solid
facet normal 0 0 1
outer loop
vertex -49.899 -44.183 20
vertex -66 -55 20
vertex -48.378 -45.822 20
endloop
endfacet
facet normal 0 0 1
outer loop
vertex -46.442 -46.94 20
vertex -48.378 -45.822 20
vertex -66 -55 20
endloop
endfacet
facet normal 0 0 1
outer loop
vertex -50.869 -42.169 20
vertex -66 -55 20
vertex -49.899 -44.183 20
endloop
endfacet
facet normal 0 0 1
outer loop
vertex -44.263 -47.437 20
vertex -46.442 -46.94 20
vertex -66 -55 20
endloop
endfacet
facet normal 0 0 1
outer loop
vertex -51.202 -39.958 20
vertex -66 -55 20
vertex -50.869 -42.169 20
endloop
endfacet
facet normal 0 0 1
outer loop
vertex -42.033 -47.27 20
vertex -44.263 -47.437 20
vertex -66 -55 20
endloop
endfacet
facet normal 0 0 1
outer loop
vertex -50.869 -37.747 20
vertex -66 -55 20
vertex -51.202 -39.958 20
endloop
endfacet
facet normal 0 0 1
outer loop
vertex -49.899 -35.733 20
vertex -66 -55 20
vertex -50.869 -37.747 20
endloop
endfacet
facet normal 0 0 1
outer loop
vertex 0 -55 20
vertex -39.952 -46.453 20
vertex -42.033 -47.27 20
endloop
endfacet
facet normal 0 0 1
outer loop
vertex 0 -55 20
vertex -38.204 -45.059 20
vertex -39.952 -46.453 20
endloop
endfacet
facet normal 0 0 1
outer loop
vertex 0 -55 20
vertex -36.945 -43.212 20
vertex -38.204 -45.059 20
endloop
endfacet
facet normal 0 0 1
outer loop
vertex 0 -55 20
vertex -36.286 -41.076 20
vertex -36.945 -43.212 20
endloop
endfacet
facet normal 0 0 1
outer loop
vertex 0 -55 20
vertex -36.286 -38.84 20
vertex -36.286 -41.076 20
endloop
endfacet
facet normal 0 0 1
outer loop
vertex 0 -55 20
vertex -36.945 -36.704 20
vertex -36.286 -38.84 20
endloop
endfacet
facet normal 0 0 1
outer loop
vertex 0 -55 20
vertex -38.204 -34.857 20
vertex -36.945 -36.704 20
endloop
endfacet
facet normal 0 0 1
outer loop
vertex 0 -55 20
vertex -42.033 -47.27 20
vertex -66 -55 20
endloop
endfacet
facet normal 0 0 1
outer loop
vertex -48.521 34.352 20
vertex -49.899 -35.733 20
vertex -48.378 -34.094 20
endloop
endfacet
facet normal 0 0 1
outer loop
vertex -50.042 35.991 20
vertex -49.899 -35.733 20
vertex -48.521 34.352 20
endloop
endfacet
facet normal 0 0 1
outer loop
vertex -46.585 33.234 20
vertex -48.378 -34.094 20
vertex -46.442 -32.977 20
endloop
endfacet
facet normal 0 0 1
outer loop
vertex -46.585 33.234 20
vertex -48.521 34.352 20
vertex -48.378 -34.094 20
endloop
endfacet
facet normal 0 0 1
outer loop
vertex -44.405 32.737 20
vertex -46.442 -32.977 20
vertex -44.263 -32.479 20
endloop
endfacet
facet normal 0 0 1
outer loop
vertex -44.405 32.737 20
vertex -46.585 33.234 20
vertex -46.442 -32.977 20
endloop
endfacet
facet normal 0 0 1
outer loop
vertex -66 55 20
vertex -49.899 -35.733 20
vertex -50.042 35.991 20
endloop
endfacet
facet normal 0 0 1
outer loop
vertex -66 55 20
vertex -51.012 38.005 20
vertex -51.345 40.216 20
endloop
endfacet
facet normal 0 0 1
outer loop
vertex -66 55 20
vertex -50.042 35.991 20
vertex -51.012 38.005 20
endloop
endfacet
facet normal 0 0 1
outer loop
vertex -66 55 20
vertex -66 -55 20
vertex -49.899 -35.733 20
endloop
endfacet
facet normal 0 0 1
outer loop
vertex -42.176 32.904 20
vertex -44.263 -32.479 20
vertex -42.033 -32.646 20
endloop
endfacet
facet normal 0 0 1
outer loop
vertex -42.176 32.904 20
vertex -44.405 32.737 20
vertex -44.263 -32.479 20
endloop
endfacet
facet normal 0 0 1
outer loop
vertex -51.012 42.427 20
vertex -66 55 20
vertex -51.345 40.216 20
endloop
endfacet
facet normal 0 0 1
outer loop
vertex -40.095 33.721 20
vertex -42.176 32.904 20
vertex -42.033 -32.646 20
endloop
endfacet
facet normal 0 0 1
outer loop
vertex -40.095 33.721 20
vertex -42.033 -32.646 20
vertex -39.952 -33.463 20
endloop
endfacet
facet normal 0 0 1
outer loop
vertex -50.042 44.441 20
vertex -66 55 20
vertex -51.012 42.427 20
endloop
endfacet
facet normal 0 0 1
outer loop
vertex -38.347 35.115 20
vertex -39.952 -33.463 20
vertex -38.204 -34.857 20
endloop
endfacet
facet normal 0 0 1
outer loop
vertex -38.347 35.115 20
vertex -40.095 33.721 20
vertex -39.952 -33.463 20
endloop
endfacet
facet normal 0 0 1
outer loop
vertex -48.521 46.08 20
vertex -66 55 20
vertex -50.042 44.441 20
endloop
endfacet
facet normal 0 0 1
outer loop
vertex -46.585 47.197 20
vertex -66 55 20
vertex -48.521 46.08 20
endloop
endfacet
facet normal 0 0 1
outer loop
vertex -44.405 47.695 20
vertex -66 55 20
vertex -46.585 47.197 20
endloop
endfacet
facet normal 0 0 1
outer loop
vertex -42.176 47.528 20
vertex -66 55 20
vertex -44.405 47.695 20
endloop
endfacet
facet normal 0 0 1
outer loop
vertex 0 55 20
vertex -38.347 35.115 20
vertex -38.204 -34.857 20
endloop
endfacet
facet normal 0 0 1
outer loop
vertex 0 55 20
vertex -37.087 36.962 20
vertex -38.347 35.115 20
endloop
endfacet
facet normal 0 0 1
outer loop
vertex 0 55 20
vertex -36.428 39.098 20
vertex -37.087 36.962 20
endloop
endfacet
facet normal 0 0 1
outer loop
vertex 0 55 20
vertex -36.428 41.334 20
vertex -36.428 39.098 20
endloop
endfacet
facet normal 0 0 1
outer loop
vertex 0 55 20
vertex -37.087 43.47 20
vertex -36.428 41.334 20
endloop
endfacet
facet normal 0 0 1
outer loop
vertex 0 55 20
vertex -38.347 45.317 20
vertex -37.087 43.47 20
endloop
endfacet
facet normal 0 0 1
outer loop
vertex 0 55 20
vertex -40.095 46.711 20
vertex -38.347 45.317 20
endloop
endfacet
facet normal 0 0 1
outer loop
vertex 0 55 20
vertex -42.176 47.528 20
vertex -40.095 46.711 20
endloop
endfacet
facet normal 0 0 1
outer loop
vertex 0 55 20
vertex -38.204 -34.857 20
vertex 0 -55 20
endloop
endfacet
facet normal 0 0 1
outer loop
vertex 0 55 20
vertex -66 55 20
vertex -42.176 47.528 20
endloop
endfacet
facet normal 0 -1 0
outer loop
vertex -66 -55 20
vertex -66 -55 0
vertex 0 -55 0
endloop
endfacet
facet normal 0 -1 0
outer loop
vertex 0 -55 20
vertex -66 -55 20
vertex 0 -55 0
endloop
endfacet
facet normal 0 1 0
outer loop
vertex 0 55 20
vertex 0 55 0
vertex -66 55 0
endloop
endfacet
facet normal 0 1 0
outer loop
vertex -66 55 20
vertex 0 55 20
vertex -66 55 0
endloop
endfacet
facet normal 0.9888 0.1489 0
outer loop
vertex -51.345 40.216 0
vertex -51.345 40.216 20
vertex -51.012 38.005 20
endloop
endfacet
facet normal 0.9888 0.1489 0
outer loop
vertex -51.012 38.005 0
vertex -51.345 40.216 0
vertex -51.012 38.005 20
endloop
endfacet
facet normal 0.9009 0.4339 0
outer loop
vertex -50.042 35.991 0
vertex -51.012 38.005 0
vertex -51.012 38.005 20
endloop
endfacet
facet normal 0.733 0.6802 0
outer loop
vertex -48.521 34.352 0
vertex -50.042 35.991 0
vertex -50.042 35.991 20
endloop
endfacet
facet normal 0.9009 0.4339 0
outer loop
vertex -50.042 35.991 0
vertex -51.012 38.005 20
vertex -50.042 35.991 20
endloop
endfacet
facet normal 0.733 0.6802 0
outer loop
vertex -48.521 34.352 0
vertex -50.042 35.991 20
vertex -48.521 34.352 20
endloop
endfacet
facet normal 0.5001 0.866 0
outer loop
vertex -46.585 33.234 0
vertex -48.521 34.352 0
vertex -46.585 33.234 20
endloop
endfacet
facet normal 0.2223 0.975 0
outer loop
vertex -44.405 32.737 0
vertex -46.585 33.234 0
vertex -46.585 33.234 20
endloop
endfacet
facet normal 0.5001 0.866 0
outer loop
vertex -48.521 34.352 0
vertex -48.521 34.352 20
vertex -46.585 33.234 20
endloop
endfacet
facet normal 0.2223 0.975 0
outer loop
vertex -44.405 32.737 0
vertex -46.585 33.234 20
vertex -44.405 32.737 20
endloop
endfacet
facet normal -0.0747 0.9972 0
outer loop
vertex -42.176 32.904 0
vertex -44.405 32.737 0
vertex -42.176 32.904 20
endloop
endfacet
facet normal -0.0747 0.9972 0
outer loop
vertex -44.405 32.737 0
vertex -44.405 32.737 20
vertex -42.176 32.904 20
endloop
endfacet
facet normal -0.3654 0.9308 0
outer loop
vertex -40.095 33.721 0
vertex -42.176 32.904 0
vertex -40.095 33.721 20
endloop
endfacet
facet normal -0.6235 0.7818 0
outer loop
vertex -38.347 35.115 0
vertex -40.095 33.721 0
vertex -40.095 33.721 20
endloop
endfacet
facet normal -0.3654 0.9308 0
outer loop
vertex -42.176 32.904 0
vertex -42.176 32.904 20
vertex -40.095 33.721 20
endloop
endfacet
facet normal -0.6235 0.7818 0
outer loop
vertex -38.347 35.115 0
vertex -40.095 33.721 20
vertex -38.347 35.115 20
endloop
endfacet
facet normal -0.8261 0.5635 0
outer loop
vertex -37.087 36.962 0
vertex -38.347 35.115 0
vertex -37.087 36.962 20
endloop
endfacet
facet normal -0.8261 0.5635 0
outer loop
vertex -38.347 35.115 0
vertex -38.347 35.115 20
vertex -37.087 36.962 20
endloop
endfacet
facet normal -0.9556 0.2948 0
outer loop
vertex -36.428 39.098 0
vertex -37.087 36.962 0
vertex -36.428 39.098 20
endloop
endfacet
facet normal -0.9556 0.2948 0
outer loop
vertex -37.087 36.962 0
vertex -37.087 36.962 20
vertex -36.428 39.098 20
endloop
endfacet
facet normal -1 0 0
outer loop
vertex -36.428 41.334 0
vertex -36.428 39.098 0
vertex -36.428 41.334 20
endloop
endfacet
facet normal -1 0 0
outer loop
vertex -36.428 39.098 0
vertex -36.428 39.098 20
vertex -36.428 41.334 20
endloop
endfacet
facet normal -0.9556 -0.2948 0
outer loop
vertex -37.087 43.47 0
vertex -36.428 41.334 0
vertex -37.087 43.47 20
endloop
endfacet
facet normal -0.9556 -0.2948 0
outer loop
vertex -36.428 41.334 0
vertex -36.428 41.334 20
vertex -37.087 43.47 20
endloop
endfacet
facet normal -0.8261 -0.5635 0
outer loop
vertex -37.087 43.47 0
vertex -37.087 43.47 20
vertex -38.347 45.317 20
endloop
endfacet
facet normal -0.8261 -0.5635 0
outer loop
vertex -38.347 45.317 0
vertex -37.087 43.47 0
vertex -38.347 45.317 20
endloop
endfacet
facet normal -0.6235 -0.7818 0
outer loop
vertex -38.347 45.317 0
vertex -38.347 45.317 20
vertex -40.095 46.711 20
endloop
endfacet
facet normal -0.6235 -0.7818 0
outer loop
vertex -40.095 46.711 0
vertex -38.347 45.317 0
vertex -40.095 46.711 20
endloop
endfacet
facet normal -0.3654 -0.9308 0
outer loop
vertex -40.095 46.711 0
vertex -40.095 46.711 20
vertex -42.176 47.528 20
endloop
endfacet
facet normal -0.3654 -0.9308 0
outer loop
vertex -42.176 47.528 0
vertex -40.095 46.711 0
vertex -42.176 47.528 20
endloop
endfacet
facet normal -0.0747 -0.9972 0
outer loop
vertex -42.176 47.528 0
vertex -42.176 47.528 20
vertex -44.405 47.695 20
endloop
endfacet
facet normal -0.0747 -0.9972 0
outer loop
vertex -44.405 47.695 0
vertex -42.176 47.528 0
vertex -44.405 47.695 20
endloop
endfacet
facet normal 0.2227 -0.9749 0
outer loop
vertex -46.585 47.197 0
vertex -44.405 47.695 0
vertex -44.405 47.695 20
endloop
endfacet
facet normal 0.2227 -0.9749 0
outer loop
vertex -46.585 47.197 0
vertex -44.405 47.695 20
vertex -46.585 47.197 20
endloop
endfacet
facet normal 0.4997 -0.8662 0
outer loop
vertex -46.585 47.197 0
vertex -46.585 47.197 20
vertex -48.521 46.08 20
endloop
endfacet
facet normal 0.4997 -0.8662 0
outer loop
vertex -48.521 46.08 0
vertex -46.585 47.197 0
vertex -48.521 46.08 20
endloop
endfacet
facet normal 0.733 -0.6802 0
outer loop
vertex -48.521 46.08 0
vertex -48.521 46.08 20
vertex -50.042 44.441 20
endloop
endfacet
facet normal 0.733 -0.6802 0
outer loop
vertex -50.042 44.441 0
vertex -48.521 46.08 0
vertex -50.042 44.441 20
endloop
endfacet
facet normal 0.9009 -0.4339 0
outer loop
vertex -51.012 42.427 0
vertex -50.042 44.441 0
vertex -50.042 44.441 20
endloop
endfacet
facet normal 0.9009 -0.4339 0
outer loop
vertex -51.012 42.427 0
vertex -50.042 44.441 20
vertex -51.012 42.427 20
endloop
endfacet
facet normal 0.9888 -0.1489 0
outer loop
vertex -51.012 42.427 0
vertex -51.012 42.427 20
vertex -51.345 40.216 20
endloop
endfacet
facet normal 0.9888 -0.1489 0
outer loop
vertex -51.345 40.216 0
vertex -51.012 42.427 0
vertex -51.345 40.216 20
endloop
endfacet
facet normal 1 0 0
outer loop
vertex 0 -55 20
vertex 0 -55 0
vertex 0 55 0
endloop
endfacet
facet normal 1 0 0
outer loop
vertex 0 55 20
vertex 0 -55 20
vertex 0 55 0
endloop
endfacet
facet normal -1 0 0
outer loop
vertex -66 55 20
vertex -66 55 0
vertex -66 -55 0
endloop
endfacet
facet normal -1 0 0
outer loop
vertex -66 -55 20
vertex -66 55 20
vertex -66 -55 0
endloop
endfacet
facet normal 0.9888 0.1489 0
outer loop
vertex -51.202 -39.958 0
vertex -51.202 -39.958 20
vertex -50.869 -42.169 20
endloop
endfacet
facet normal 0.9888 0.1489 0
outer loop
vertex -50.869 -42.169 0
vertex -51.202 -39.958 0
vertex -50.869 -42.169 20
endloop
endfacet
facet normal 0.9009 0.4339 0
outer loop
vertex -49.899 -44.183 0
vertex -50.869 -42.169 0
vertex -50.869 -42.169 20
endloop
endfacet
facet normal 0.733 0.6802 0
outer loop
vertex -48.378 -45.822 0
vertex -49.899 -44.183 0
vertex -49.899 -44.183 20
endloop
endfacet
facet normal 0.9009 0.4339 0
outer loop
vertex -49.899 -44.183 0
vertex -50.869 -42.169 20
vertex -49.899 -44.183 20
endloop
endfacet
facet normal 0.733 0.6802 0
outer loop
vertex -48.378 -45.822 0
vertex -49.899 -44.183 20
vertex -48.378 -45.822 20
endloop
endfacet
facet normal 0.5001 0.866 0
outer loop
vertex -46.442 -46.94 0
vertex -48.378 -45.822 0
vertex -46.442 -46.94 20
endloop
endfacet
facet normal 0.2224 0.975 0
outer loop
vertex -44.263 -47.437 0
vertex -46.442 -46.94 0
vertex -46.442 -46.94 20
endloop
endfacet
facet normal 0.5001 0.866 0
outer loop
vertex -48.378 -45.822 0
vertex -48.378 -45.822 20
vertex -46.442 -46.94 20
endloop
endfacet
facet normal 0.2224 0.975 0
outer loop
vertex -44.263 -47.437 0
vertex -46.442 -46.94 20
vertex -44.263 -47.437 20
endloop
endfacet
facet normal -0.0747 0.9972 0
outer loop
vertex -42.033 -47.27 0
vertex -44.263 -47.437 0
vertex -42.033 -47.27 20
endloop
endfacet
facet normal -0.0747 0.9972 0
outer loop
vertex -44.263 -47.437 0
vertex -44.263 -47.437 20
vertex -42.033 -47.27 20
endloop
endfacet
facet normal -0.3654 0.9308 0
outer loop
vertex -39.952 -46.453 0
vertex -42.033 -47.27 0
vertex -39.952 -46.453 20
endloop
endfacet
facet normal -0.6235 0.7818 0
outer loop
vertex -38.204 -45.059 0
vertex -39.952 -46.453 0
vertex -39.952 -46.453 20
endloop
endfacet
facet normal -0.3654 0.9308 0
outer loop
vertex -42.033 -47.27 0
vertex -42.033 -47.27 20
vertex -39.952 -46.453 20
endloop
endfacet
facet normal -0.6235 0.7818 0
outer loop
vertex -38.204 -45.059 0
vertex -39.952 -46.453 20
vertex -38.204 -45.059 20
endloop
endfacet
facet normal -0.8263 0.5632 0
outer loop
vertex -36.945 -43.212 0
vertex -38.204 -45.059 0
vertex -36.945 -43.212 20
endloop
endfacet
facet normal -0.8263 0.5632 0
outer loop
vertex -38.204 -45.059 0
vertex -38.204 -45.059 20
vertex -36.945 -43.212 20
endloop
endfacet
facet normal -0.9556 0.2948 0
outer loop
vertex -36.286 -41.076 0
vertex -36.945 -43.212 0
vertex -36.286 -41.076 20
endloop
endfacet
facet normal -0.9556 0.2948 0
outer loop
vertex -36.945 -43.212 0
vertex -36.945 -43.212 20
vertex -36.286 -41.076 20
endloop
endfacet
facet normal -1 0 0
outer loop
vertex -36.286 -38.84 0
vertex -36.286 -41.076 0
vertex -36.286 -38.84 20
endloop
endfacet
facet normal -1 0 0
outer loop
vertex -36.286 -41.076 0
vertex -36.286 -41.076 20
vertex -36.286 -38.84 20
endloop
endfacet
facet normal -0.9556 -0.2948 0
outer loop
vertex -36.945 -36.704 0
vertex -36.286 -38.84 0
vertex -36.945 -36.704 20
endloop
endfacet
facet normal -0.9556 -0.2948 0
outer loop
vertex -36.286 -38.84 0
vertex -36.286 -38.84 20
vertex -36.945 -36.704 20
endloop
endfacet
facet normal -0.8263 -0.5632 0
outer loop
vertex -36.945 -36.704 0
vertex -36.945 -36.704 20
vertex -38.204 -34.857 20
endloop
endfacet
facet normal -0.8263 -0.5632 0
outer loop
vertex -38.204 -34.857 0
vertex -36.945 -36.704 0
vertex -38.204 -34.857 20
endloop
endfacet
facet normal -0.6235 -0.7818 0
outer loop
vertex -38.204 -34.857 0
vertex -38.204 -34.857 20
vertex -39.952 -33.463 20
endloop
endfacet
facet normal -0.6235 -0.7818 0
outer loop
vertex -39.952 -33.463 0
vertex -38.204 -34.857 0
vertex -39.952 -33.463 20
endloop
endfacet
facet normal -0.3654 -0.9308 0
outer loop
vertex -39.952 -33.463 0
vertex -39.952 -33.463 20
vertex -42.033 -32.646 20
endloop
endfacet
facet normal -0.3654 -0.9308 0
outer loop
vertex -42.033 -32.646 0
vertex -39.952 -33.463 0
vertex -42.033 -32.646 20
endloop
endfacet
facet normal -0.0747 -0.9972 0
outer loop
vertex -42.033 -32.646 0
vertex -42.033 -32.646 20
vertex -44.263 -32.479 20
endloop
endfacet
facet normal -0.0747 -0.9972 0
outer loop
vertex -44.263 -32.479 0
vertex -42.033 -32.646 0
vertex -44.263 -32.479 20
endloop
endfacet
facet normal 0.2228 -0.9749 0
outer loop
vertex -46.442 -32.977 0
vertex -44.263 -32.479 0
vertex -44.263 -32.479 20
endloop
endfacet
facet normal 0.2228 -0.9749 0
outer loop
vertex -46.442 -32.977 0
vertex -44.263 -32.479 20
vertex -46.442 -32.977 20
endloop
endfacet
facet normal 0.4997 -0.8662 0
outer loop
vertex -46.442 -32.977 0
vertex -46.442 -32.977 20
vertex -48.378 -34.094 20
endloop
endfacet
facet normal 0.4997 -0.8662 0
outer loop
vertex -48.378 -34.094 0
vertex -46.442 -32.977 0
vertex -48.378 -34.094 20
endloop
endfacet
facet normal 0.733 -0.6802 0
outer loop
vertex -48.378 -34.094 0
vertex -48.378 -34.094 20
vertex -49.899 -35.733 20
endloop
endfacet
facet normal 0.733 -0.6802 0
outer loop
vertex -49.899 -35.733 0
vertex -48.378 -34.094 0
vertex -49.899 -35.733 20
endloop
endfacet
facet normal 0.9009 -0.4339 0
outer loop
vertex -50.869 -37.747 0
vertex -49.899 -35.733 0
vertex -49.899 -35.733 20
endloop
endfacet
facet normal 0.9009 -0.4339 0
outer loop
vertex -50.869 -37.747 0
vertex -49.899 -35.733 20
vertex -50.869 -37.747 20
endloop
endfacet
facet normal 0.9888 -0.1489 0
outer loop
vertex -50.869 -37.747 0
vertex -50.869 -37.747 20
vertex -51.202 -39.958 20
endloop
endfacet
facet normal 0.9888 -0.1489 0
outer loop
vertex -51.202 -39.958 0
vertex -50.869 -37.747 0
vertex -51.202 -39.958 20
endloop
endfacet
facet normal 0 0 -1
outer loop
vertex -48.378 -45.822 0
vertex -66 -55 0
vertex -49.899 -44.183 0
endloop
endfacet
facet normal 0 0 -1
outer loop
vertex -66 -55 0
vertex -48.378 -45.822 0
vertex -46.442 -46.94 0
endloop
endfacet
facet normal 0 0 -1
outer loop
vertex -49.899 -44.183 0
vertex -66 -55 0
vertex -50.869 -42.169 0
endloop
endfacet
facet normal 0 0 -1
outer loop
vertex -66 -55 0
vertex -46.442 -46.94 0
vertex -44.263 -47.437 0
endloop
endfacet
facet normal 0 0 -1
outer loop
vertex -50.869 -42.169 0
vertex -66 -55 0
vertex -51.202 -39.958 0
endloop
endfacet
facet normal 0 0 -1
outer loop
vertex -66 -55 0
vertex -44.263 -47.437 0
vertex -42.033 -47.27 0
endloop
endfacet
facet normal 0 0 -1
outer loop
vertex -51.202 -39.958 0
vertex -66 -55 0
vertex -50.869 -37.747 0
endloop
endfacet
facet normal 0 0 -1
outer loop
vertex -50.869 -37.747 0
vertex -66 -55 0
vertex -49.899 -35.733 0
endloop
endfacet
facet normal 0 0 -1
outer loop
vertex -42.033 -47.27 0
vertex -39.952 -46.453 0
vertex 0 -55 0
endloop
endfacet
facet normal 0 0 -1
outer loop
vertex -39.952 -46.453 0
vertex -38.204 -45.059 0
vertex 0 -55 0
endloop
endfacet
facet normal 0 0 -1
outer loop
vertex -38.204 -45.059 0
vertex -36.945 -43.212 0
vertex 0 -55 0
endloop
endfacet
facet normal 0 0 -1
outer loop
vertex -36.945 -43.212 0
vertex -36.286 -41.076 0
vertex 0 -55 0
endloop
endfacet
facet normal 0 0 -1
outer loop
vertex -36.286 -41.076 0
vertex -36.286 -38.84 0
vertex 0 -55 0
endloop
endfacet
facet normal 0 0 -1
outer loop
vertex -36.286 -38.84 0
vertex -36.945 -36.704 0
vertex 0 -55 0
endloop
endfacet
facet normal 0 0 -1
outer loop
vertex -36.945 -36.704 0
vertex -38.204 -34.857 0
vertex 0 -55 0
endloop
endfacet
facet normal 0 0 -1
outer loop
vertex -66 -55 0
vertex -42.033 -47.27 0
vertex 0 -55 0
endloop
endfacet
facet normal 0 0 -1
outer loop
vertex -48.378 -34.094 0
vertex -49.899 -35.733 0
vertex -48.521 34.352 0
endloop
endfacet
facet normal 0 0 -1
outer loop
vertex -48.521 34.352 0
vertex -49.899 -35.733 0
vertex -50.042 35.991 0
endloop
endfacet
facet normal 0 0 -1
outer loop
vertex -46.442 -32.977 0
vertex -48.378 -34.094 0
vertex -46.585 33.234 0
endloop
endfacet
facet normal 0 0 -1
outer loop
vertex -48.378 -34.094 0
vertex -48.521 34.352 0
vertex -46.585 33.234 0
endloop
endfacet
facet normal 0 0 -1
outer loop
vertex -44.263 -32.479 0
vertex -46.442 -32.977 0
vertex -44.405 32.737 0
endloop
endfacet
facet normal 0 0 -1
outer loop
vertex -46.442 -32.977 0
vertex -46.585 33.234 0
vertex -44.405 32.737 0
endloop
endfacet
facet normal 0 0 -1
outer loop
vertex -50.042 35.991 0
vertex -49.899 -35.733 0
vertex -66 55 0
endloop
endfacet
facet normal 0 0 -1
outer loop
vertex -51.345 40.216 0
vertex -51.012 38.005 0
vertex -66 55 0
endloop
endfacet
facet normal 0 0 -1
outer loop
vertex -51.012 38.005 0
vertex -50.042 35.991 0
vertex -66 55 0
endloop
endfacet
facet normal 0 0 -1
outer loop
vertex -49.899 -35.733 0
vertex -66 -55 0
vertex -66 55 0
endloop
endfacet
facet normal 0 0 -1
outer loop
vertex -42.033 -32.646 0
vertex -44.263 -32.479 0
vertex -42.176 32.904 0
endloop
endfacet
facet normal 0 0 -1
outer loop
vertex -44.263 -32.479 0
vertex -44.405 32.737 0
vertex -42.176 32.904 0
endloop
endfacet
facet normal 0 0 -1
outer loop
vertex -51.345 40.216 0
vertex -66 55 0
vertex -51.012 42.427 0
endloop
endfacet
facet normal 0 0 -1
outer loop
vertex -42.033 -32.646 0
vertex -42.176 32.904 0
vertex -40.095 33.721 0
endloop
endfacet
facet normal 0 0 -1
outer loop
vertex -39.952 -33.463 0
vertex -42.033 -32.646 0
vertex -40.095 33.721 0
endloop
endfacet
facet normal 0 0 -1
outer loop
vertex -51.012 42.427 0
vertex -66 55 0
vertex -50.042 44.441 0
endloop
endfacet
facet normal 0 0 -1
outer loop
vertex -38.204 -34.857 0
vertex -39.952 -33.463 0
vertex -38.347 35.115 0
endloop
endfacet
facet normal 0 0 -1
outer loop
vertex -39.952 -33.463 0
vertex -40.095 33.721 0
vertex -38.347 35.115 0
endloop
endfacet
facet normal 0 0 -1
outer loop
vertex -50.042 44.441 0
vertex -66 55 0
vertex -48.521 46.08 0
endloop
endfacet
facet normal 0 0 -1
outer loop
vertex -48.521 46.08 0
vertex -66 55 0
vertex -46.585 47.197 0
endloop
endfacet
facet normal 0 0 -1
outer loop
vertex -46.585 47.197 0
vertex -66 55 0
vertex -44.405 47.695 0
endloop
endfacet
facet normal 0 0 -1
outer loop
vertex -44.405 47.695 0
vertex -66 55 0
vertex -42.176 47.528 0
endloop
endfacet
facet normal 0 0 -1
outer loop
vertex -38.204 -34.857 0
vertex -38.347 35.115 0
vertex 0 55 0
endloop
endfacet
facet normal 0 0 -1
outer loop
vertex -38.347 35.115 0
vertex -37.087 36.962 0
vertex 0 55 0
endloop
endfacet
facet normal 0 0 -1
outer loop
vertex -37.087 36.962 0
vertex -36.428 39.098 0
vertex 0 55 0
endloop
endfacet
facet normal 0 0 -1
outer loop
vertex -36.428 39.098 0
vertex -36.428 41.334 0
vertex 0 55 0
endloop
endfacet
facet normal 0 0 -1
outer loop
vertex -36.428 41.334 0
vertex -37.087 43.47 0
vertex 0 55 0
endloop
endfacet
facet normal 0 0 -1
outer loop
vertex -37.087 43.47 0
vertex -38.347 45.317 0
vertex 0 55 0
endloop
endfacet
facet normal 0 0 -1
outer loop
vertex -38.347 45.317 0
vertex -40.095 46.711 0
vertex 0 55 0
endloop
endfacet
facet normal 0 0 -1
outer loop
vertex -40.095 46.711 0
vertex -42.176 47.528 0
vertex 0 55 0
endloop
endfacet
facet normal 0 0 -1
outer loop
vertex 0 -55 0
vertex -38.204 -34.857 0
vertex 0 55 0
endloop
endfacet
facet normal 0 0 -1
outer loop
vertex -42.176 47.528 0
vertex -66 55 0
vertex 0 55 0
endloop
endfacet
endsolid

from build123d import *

# Parameters (mm, degrees)
F0_W     = 22
F0_H     = 15
F0_W_2   = 44
F0_H_2   = 80
F1_DEPTH = 20
F3_D     = 15


with BuildPart() as f1:
    # F0 (on Top) → F1 (new body)
    with BuildSketch(Plane.XY):
        with Locations((-55, 47.5)):
            Rectangle(F0_W, F0_H)
        with Locations((-22, 47.5)):
            Rectangle(F0_W_2, F0_H)
        Polygon((0, -40), (0, 0), (0, 40), (-44, 40), (-44, -40), align=None)
        with Locations((-55, 0)):
            Rectangle(F0_W, F0_H_2)
        with Locations((-55, -47.5)):
            Rectangle(F0_W, F0_H)
        with Locations((-22, -47.5)):
            Rectangle(F0_W_2, F0_H)
    extrude(amount=F1_DEPTH)

    # F3 (through all)
    with Locations(Plane(origin=(0, 0, 0), x_dir=(1, 0, 0), z_dir=(0, 0, -1))):
        with Locations((-43.8447110355, -40.2159020305), (-43.7023043633, 39.95815292)):
            Hole(F3_D / 2)


solid = f1.part
